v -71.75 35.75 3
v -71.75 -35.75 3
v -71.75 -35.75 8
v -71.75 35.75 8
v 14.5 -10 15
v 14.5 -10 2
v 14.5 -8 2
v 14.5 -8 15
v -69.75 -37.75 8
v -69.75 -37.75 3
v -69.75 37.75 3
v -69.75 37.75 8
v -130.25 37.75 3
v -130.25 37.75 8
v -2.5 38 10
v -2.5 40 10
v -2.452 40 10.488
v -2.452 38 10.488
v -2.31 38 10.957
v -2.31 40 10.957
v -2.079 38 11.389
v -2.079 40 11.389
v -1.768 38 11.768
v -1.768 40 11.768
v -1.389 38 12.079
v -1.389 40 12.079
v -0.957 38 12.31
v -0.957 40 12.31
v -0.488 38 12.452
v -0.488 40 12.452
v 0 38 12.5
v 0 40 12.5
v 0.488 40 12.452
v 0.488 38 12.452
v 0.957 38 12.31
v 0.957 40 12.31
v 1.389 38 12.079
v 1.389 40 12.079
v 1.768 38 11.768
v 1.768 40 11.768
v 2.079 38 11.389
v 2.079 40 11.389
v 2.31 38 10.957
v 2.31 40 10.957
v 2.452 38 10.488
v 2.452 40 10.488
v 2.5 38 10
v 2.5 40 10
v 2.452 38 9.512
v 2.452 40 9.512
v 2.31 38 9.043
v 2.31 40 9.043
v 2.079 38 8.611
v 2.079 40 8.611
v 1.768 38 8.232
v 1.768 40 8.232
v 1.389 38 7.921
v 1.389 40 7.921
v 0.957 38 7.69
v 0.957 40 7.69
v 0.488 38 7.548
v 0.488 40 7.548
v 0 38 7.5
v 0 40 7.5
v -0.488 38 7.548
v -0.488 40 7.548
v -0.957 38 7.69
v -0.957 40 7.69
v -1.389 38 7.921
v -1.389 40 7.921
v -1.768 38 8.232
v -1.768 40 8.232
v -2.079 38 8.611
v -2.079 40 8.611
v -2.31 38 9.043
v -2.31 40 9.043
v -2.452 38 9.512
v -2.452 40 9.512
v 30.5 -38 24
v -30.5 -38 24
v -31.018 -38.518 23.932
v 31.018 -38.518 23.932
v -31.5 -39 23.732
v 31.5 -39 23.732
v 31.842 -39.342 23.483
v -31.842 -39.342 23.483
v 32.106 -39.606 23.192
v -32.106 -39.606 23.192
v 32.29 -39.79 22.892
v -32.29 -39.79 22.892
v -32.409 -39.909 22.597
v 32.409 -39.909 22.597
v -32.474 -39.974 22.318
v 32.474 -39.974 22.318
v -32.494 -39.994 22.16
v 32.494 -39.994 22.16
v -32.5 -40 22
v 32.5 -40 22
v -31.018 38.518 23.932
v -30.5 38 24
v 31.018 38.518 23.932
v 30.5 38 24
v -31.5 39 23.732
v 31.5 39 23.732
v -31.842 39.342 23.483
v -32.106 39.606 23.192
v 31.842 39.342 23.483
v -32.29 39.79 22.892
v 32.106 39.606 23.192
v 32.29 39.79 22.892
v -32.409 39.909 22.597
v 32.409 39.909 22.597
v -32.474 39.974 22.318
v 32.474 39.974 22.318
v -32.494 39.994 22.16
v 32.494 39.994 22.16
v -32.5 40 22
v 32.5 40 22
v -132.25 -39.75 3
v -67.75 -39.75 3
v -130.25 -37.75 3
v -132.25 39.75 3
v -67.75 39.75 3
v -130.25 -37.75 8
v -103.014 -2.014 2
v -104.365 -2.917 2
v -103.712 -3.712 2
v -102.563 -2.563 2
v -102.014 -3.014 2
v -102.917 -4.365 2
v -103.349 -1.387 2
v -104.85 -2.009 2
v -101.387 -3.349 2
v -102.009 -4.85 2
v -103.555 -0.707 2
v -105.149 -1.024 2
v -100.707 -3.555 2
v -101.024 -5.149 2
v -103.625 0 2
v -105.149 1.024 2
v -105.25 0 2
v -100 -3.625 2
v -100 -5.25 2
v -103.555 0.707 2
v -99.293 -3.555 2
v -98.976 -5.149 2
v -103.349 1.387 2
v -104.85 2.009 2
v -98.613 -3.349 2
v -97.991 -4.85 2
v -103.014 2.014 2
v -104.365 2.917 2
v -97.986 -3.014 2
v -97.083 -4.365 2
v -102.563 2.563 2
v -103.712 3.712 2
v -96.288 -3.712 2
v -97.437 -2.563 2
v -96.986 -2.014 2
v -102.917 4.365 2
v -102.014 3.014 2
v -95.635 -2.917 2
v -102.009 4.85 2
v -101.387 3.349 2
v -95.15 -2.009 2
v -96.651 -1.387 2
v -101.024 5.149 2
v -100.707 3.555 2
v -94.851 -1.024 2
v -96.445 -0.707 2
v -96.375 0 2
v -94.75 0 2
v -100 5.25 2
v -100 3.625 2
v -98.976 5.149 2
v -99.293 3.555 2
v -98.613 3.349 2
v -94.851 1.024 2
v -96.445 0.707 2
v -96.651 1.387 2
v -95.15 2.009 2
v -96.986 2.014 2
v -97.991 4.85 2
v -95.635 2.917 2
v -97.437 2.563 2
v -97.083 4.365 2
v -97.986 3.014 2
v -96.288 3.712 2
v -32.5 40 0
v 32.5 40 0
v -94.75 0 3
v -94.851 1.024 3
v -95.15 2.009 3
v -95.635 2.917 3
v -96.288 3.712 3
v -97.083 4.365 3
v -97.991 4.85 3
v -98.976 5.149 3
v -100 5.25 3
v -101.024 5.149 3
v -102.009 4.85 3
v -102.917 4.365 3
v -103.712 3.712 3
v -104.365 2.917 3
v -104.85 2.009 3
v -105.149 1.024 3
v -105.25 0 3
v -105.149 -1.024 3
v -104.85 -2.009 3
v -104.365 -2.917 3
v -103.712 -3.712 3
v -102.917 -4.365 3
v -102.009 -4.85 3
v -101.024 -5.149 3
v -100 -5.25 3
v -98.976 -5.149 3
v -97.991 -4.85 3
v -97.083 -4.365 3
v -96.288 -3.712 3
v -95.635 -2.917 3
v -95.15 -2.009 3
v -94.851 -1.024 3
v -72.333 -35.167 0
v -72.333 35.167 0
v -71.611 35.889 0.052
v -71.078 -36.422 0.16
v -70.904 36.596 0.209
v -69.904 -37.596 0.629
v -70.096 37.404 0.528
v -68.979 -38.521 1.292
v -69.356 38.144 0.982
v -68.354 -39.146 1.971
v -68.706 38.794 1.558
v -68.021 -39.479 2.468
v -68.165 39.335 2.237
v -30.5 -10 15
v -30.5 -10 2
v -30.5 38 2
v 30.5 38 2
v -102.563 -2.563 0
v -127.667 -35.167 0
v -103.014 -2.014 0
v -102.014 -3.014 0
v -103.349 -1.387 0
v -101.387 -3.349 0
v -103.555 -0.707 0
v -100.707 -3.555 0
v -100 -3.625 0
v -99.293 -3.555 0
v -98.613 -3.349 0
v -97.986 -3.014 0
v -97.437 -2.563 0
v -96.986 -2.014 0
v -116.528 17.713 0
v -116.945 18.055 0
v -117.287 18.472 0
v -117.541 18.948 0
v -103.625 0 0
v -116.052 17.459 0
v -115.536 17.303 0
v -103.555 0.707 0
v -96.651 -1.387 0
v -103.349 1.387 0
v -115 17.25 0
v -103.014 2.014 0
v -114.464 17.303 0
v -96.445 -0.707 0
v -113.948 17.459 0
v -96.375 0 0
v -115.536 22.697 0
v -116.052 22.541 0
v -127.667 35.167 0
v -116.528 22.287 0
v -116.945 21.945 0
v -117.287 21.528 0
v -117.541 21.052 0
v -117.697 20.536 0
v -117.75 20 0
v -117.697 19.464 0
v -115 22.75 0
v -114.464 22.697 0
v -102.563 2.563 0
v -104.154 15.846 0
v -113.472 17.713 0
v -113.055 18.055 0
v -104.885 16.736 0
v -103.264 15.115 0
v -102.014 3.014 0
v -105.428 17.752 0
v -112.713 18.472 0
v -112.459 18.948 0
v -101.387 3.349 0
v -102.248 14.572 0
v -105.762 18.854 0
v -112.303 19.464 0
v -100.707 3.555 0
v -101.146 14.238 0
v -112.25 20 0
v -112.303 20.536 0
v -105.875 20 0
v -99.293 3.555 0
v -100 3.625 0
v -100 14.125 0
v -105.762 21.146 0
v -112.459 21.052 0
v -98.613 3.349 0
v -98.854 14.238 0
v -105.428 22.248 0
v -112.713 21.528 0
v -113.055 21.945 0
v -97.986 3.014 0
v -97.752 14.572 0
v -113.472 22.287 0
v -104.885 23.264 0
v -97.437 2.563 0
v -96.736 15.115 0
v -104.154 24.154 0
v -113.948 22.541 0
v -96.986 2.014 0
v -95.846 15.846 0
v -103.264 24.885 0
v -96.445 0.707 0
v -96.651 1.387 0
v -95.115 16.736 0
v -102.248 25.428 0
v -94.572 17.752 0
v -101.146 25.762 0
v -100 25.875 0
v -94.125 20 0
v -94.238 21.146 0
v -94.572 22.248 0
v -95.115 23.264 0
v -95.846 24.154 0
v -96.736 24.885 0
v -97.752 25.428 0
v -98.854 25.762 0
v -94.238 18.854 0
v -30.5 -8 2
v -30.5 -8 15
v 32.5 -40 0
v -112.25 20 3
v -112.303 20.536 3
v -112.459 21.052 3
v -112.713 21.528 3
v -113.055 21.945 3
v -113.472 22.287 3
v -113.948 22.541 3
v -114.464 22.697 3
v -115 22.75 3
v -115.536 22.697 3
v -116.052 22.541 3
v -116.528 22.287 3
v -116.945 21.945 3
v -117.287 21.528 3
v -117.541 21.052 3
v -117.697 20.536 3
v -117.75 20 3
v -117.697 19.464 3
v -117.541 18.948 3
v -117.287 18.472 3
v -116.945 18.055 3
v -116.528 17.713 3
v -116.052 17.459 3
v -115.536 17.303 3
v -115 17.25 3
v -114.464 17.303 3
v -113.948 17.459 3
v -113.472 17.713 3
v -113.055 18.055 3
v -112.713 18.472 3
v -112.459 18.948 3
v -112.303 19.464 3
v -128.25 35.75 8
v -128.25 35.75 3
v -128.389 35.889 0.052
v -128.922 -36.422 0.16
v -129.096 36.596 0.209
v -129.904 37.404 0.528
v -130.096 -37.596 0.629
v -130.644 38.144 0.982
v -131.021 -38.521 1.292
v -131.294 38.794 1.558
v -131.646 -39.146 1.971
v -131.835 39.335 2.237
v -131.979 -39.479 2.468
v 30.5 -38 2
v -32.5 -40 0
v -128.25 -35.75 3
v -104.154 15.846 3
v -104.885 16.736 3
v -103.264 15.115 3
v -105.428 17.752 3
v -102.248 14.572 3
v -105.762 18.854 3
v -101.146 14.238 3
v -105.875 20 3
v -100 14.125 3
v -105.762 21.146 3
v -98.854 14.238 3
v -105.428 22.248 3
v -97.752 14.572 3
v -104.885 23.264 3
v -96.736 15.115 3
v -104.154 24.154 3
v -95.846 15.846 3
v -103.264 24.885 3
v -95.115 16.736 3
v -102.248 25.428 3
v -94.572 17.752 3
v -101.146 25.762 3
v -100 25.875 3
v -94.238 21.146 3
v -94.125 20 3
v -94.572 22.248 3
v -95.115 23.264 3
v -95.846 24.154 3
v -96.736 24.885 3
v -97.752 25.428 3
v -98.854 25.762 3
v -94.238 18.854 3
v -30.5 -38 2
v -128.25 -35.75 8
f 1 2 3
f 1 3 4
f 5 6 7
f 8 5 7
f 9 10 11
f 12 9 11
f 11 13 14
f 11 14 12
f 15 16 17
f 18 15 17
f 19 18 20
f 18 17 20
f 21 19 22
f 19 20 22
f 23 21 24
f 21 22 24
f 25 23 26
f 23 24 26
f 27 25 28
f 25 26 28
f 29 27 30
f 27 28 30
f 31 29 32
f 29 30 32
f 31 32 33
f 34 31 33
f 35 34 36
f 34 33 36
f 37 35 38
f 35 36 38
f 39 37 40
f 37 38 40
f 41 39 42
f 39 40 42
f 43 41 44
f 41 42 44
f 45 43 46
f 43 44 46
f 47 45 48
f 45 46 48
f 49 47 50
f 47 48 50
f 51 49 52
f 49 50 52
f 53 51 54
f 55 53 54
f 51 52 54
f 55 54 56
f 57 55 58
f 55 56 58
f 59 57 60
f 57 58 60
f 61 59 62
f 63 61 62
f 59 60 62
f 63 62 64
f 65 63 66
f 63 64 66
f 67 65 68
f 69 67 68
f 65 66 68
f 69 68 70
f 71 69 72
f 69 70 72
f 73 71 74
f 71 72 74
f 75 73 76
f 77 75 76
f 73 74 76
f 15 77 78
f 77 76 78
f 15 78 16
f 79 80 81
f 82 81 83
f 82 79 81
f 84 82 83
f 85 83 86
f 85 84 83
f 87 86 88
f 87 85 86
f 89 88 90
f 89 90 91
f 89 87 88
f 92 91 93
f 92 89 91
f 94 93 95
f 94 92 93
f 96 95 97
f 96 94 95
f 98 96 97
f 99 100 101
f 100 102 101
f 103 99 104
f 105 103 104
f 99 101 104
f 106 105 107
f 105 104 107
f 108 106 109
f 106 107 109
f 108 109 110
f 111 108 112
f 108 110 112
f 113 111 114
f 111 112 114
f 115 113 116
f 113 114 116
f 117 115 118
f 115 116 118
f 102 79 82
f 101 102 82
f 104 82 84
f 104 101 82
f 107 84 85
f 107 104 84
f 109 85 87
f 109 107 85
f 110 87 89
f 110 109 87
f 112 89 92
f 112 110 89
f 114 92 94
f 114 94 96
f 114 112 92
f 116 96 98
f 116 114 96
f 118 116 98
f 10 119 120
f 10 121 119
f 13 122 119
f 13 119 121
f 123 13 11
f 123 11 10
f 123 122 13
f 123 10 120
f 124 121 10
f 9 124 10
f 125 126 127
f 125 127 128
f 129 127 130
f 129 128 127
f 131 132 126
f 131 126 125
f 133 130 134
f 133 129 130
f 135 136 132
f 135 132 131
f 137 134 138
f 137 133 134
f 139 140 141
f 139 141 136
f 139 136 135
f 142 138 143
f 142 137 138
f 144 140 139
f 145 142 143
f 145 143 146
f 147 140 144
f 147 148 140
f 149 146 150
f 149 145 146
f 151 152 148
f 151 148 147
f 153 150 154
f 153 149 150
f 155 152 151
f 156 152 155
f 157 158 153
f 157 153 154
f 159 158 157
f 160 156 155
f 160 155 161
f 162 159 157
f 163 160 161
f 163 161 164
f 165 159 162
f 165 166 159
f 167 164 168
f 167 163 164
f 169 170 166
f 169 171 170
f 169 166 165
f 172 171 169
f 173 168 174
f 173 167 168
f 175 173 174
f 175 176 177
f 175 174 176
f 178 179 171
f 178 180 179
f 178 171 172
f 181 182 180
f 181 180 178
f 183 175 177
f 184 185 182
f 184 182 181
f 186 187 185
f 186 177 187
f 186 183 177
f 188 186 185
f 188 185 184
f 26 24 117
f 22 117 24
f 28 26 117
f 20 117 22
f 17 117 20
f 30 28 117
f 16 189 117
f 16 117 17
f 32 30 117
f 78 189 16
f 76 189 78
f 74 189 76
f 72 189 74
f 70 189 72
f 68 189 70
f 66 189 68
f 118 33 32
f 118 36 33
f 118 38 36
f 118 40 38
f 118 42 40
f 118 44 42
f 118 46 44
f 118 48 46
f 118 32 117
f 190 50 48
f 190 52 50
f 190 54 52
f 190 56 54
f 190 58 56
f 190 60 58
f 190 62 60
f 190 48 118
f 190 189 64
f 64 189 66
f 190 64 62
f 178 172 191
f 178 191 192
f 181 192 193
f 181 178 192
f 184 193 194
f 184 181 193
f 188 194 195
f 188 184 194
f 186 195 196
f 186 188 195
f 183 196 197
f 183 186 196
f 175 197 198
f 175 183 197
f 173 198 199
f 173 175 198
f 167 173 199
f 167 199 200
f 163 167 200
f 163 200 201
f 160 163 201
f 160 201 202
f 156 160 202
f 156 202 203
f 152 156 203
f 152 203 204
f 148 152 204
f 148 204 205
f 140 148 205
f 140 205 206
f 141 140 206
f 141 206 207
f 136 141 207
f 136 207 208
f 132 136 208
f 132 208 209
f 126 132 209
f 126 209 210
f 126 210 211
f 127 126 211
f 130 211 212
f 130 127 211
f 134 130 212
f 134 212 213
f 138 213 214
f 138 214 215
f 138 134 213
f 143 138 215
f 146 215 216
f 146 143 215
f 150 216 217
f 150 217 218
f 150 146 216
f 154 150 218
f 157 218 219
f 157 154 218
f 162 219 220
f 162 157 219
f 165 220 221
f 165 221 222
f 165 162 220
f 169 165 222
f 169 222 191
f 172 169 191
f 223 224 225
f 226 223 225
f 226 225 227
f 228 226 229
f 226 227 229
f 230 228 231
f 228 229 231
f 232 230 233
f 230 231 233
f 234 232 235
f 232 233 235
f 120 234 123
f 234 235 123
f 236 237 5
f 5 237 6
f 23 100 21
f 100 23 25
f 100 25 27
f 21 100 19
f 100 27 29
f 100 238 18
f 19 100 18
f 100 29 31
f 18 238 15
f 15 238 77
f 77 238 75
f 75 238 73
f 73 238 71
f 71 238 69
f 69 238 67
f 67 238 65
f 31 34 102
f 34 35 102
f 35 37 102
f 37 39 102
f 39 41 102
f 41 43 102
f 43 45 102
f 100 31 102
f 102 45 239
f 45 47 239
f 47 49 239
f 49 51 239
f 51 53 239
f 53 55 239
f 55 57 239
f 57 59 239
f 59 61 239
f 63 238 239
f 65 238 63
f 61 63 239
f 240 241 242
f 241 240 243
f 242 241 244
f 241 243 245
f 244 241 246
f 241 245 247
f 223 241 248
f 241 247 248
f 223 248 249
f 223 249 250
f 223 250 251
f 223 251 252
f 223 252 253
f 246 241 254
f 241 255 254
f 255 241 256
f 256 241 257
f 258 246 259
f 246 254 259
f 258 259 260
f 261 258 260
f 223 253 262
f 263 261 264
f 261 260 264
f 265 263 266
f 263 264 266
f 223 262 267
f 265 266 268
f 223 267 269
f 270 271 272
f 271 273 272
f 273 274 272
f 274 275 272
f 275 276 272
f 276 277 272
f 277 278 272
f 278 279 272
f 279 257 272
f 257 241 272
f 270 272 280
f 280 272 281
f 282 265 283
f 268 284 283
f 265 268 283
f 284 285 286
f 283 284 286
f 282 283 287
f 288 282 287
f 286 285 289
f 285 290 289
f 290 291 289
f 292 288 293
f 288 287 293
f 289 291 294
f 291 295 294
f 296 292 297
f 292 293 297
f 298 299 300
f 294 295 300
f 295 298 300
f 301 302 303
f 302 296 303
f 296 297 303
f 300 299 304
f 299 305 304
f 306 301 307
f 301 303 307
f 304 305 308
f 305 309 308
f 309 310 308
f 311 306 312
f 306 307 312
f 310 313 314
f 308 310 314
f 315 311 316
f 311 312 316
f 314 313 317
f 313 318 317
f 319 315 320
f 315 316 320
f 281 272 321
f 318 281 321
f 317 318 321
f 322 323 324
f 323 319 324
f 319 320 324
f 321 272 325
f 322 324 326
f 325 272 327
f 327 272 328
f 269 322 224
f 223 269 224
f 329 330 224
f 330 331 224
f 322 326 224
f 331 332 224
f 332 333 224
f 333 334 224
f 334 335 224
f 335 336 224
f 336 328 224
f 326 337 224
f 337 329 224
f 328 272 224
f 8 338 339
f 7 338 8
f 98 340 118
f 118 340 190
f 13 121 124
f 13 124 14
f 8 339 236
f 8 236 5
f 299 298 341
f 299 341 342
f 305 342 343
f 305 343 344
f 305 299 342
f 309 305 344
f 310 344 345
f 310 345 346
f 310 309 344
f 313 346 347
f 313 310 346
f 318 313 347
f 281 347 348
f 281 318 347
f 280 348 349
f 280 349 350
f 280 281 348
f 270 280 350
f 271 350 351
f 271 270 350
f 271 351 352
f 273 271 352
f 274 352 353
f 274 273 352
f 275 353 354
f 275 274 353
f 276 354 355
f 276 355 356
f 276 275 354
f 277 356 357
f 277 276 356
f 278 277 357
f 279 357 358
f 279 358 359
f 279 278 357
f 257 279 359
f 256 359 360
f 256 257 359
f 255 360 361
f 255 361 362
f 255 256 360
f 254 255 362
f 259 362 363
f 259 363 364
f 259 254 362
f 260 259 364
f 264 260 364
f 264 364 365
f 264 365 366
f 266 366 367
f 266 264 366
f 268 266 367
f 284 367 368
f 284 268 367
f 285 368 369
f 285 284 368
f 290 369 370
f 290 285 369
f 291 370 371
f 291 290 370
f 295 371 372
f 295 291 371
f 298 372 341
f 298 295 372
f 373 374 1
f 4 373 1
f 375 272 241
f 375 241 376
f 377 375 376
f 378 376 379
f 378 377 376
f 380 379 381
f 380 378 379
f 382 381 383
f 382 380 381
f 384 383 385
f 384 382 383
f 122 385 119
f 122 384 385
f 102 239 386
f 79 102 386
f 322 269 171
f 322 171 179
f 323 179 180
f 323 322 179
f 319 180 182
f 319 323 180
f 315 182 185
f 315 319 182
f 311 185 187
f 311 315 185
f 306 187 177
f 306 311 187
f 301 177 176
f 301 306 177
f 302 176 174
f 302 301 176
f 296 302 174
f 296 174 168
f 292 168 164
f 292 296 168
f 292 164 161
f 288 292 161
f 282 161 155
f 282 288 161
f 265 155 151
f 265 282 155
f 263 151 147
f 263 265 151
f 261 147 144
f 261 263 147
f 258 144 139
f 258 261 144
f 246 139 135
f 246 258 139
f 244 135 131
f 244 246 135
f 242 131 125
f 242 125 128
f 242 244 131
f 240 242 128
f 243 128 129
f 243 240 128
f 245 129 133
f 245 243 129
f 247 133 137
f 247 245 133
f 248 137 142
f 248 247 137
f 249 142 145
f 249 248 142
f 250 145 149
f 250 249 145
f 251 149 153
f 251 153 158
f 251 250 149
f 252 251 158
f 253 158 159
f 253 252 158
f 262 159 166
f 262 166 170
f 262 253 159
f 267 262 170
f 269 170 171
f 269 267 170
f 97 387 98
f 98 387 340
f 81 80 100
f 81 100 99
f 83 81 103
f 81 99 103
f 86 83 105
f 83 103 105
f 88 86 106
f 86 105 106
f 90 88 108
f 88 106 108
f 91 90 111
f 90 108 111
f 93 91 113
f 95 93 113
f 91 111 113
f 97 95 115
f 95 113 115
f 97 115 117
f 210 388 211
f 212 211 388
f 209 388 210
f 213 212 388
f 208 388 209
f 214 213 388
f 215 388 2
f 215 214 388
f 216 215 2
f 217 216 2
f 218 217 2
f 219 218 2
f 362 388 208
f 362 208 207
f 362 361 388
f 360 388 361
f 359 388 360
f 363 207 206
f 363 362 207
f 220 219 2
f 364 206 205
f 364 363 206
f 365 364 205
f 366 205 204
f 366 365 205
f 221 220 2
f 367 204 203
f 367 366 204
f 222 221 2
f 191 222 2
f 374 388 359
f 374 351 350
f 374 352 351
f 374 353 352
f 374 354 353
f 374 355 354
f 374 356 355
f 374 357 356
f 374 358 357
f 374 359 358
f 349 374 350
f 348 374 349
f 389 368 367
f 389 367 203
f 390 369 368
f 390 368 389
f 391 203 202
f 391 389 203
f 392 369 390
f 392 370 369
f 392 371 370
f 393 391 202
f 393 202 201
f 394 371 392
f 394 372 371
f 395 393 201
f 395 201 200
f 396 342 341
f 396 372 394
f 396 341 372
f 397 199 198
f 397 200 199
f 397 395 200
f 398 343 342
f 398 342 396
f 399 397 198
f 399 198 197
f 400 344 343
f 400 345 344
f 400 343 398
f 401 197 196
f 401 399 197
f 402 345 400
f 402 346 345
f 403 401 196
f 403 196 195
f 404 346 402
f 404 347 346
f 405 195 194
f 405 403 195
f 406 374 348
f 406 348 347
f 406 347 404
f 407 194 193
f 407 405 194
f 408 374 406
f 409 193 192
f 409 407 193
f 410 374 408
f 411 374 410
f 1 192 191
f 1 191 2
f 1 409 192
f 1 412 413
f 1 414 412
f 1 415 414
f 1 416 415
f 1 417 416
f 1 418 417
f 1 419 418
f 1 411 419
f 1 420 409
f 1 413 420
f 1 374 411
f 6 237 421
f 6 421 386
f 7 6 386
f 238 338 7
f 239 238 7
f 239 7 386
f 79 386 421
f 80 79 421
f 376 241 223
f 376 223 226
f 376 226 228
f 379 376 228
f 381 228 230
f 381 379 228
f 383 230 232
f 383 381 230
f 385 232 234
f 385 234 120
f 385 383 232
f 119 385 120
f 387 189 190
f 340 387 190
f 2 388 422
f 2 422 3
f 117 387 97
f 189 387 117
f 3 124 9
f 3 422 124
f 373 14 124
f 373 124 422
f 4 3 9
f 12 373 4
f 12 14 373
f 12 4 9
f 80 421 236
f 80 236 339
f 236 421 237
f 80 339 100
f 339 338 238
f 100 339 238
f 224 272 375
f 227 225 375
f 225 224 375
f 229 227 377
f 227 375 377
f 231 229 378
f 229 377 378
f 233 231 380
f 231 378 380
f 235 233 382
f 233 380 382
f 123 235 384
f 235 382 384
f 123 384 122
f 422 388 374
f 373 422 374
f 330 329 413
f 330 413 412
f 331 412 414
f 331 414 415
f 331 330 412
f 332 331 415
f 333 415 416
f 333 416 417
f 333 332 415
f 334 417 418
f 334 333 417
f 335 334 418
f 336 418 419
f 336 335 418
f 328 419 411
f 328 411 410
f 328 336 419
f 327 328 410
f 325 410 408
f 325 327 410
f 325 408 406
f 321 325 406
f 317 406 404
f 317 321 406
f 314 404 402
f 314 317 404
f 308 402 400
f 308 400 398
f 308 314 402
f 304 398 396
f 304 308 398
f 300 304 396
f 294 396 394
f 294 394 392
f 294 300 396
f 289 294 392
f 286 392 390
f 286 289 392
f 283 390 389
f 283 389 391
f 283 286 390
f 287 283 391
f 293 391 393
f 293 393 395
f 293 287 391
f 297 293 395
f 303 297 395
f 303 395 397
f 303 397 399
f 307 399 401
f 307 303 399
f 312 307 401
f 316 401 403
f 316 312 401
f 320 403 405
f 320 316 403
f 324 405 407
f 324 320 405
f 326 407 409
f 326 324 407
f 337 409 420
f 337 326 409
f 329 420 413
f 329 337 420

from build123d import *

# Parameters (mm, degrees)
F1_DEPTH     = 2
F0_W         = 65
F0_H         = 80
F2_DEPTH     = 24
F0_W_2       = 45
F0_H_2       = 2
F3_DEPTH     = 15
F4_R         = 2.5
F5_DEPTH     = 2
F6_R         = 1.99999
F0_W_3       = 64.5
F0_H_3       = 79.5
F0_W_4       = 60.5
F0_H_4       = 75.5
F7_DEPTH     = 3
F0_W_5       = 56.5
F0_H_5       = 71.5
F0_R         = 5.25
F0_R_2       = 2.75
F0_R_3       = 5.875
F8_DEPTH     = 8
F0_R_4       = 3.625
F9_DEPTH     = 2
F10_T1_DEPTH = 87.4128784748
F10_T3_DEPTH = 102.4128784748


# Not quite as in the source:
# - a fillet or chamfer that OpenCascade refuses, or shapes differently, is made with other operations: its cross-section is extruded or revolved along the edge and cut away or added
# - a fillet or chamfer is up to 0.001 mm smaller than in the source, because OpenCascade refuses the exact size


with BuildPart() as f1:
    # F0 (on Top) → F1 (new body)
    with BuildSketch(Plane.XY):
        Polygon((30.5, 38), (-30.5, 38), (-30.5, -8), (14.5, -8), (14.5, -10), (-30.5, -10), (-30.5, -38), (30.5, -38), align=None)
    extrude(amount=F1_DEPTH)

    # F0 (on Top) → F2 (join)
    with BuildSketch(Plane.XY):
        Rectangle(F0_W, F0_H)
        Polygon((-30.5, -8), (-30.5, 38), (30.5, 38), (30.5, -38), (-30.5, -38), (-30.5, -10), align=None, mode=Mode.SUBTRACT)
    extrude(amount=F2_DEPTH)

    # F0 (on Top) → F3 (join)
    with BuildSketch(Plane.XY):
        with Locations((-8, -9)):
            Rectangle(F0_W_2, F0_H_2)
    extrude(amount=F3_DEPTH)

    # F4 (on face) → F5 (cut, through all)
    with BuildSketch(Plane(origin=(0, 40, 0), x_dir=(-1, 0, 0), z_dir=(0, 1, 0))):
        with Locations((0, 10)):
            Circle(F4_R)
    extrude(amount=-F5_DEPTH, mode=Mode.SUBTRACT)

    # F6 (radius 2 in the source; OpenCascade refuses exactly that, so slightly less here)
    f6_edges = [f1.edges().sort_by_distance(p)[0] for p in [
        (-32.5, 0, 24),
        (0, 40, 24),
        (32.5, 0, 24),
        (0, -40, 24),
    ]]
    fillet(f6_edges, radius=F6_R)


with BuildPart() as f7:
    # F0 (on Top) → F7 (new body)
    with BuildSketch(Plane.XY):
        with Locations((-100, 0)):
            Rectangle(F0_W_3, F0_H_3)
        with Locations((-100, 0)):
            Rectangle(F0_W_4, F0_H_4, mode=Mode.SUBTRACT)
    extrude(amount=F7_DEPTH)



with BuildPart() as f7b:
    # F0 (on Top) → F7, piece 2 (new body)
    with BuildSketch(Plane.XY):
        with Locations((-100, 0)):
            Rectangle(F0_W_5, F0_H_5)
        with Locations((-100, 0)):
            Circle(F0_R, mode=Mode.SUBTRACT)
        with Locations((-115, 20)):
            Circle(F0_R_2, mode=Mode.SUBTRACT)
        with Locations((-100, 20)):
            Circle(F0_R_3, mode=Mode.SUBTRACT)
    extrude(amount=F7_DEPTH)


with BuildPart() as f7_1:
    add(f7.part)

    add(f7b.part)  # F8 merges F7b
    # F0 (on Top) → F8 (join)
    with BuildSketch(Plane.XY):
        with Locations((-100, 0)):
            Rectangle(F0_W_4, F0_H_4)
        with Locations((-100, 0)):
            Rectangle(F0_W_5, F0_H_5, mode=Mode.SUBTRACT)
    extrude(amount=F8_DEPTH)

    # F0 (on Top) → F9 (join)
    with BuildSketch(Plane.XY):
        with Locations((-100, 0)):
            Circle(F0_R)
        with Locations((-100, 0)):
            Circle(F0_R_4, mode=Mode.SUBTRACT)
    extrude(amount=F9_DEPTH)

    # F10: fillet of radius 5 on 4 edges, made by hand

    # F10_s2 → F10_t1 (cut)
    with BuildSketch(Plane.YZ.offset(-143.7064392374)):
        with BuildLine():
            ThreePointArc((35.167424305, 0), (37.9060370926, 0.8166998673), (39.75, 3))
            Line((39.75, 3), (39.75, 0))
            Line((39.75, 0), (35.167424305, 0))
        make_face()
        with BuildLine():
            ThreePointArc((-35.167424305, 0), (-37.9060370926, 0.8166998673), (-39.75, 3))
            Line((-39.75, 3), (-39.75, 0))
            Line((-39.75, 0), (-35.167424305, 0))
        make_face()
    extrude(amount=F10_T1_DEPTH, mode=Mode.SUBTRACT)

    # F10_s4 → F10_t3 (cut)
    with BuildSketch(Plane.XZ.offset(-51.2064392374)):
        with BuildLine():
            ThreePointArc((-127.667424305, 0), (-130.4060370926, 0.8166998673), (-132.25, 3))
            Line((-132.25, 3), (-132.25, 0))
            Line((-132.25, 0), (-127.667424305, 0))
        make_face()
        with BuildLine():
            ThreePointArc((-72.332575695, 0), (-69.5939629074, 0.8166998673), (-67.75, 3))
            Line((-67.75, 3), (-67.75, 0))
            Line((-67.75, 0), (-72.332575695, 0))
        make_face()
    extrude(amount=F10_T3_DEPTH, mode=Mode.SUBTRACT)


solid = Compound([f1.part, f7_1.part])
